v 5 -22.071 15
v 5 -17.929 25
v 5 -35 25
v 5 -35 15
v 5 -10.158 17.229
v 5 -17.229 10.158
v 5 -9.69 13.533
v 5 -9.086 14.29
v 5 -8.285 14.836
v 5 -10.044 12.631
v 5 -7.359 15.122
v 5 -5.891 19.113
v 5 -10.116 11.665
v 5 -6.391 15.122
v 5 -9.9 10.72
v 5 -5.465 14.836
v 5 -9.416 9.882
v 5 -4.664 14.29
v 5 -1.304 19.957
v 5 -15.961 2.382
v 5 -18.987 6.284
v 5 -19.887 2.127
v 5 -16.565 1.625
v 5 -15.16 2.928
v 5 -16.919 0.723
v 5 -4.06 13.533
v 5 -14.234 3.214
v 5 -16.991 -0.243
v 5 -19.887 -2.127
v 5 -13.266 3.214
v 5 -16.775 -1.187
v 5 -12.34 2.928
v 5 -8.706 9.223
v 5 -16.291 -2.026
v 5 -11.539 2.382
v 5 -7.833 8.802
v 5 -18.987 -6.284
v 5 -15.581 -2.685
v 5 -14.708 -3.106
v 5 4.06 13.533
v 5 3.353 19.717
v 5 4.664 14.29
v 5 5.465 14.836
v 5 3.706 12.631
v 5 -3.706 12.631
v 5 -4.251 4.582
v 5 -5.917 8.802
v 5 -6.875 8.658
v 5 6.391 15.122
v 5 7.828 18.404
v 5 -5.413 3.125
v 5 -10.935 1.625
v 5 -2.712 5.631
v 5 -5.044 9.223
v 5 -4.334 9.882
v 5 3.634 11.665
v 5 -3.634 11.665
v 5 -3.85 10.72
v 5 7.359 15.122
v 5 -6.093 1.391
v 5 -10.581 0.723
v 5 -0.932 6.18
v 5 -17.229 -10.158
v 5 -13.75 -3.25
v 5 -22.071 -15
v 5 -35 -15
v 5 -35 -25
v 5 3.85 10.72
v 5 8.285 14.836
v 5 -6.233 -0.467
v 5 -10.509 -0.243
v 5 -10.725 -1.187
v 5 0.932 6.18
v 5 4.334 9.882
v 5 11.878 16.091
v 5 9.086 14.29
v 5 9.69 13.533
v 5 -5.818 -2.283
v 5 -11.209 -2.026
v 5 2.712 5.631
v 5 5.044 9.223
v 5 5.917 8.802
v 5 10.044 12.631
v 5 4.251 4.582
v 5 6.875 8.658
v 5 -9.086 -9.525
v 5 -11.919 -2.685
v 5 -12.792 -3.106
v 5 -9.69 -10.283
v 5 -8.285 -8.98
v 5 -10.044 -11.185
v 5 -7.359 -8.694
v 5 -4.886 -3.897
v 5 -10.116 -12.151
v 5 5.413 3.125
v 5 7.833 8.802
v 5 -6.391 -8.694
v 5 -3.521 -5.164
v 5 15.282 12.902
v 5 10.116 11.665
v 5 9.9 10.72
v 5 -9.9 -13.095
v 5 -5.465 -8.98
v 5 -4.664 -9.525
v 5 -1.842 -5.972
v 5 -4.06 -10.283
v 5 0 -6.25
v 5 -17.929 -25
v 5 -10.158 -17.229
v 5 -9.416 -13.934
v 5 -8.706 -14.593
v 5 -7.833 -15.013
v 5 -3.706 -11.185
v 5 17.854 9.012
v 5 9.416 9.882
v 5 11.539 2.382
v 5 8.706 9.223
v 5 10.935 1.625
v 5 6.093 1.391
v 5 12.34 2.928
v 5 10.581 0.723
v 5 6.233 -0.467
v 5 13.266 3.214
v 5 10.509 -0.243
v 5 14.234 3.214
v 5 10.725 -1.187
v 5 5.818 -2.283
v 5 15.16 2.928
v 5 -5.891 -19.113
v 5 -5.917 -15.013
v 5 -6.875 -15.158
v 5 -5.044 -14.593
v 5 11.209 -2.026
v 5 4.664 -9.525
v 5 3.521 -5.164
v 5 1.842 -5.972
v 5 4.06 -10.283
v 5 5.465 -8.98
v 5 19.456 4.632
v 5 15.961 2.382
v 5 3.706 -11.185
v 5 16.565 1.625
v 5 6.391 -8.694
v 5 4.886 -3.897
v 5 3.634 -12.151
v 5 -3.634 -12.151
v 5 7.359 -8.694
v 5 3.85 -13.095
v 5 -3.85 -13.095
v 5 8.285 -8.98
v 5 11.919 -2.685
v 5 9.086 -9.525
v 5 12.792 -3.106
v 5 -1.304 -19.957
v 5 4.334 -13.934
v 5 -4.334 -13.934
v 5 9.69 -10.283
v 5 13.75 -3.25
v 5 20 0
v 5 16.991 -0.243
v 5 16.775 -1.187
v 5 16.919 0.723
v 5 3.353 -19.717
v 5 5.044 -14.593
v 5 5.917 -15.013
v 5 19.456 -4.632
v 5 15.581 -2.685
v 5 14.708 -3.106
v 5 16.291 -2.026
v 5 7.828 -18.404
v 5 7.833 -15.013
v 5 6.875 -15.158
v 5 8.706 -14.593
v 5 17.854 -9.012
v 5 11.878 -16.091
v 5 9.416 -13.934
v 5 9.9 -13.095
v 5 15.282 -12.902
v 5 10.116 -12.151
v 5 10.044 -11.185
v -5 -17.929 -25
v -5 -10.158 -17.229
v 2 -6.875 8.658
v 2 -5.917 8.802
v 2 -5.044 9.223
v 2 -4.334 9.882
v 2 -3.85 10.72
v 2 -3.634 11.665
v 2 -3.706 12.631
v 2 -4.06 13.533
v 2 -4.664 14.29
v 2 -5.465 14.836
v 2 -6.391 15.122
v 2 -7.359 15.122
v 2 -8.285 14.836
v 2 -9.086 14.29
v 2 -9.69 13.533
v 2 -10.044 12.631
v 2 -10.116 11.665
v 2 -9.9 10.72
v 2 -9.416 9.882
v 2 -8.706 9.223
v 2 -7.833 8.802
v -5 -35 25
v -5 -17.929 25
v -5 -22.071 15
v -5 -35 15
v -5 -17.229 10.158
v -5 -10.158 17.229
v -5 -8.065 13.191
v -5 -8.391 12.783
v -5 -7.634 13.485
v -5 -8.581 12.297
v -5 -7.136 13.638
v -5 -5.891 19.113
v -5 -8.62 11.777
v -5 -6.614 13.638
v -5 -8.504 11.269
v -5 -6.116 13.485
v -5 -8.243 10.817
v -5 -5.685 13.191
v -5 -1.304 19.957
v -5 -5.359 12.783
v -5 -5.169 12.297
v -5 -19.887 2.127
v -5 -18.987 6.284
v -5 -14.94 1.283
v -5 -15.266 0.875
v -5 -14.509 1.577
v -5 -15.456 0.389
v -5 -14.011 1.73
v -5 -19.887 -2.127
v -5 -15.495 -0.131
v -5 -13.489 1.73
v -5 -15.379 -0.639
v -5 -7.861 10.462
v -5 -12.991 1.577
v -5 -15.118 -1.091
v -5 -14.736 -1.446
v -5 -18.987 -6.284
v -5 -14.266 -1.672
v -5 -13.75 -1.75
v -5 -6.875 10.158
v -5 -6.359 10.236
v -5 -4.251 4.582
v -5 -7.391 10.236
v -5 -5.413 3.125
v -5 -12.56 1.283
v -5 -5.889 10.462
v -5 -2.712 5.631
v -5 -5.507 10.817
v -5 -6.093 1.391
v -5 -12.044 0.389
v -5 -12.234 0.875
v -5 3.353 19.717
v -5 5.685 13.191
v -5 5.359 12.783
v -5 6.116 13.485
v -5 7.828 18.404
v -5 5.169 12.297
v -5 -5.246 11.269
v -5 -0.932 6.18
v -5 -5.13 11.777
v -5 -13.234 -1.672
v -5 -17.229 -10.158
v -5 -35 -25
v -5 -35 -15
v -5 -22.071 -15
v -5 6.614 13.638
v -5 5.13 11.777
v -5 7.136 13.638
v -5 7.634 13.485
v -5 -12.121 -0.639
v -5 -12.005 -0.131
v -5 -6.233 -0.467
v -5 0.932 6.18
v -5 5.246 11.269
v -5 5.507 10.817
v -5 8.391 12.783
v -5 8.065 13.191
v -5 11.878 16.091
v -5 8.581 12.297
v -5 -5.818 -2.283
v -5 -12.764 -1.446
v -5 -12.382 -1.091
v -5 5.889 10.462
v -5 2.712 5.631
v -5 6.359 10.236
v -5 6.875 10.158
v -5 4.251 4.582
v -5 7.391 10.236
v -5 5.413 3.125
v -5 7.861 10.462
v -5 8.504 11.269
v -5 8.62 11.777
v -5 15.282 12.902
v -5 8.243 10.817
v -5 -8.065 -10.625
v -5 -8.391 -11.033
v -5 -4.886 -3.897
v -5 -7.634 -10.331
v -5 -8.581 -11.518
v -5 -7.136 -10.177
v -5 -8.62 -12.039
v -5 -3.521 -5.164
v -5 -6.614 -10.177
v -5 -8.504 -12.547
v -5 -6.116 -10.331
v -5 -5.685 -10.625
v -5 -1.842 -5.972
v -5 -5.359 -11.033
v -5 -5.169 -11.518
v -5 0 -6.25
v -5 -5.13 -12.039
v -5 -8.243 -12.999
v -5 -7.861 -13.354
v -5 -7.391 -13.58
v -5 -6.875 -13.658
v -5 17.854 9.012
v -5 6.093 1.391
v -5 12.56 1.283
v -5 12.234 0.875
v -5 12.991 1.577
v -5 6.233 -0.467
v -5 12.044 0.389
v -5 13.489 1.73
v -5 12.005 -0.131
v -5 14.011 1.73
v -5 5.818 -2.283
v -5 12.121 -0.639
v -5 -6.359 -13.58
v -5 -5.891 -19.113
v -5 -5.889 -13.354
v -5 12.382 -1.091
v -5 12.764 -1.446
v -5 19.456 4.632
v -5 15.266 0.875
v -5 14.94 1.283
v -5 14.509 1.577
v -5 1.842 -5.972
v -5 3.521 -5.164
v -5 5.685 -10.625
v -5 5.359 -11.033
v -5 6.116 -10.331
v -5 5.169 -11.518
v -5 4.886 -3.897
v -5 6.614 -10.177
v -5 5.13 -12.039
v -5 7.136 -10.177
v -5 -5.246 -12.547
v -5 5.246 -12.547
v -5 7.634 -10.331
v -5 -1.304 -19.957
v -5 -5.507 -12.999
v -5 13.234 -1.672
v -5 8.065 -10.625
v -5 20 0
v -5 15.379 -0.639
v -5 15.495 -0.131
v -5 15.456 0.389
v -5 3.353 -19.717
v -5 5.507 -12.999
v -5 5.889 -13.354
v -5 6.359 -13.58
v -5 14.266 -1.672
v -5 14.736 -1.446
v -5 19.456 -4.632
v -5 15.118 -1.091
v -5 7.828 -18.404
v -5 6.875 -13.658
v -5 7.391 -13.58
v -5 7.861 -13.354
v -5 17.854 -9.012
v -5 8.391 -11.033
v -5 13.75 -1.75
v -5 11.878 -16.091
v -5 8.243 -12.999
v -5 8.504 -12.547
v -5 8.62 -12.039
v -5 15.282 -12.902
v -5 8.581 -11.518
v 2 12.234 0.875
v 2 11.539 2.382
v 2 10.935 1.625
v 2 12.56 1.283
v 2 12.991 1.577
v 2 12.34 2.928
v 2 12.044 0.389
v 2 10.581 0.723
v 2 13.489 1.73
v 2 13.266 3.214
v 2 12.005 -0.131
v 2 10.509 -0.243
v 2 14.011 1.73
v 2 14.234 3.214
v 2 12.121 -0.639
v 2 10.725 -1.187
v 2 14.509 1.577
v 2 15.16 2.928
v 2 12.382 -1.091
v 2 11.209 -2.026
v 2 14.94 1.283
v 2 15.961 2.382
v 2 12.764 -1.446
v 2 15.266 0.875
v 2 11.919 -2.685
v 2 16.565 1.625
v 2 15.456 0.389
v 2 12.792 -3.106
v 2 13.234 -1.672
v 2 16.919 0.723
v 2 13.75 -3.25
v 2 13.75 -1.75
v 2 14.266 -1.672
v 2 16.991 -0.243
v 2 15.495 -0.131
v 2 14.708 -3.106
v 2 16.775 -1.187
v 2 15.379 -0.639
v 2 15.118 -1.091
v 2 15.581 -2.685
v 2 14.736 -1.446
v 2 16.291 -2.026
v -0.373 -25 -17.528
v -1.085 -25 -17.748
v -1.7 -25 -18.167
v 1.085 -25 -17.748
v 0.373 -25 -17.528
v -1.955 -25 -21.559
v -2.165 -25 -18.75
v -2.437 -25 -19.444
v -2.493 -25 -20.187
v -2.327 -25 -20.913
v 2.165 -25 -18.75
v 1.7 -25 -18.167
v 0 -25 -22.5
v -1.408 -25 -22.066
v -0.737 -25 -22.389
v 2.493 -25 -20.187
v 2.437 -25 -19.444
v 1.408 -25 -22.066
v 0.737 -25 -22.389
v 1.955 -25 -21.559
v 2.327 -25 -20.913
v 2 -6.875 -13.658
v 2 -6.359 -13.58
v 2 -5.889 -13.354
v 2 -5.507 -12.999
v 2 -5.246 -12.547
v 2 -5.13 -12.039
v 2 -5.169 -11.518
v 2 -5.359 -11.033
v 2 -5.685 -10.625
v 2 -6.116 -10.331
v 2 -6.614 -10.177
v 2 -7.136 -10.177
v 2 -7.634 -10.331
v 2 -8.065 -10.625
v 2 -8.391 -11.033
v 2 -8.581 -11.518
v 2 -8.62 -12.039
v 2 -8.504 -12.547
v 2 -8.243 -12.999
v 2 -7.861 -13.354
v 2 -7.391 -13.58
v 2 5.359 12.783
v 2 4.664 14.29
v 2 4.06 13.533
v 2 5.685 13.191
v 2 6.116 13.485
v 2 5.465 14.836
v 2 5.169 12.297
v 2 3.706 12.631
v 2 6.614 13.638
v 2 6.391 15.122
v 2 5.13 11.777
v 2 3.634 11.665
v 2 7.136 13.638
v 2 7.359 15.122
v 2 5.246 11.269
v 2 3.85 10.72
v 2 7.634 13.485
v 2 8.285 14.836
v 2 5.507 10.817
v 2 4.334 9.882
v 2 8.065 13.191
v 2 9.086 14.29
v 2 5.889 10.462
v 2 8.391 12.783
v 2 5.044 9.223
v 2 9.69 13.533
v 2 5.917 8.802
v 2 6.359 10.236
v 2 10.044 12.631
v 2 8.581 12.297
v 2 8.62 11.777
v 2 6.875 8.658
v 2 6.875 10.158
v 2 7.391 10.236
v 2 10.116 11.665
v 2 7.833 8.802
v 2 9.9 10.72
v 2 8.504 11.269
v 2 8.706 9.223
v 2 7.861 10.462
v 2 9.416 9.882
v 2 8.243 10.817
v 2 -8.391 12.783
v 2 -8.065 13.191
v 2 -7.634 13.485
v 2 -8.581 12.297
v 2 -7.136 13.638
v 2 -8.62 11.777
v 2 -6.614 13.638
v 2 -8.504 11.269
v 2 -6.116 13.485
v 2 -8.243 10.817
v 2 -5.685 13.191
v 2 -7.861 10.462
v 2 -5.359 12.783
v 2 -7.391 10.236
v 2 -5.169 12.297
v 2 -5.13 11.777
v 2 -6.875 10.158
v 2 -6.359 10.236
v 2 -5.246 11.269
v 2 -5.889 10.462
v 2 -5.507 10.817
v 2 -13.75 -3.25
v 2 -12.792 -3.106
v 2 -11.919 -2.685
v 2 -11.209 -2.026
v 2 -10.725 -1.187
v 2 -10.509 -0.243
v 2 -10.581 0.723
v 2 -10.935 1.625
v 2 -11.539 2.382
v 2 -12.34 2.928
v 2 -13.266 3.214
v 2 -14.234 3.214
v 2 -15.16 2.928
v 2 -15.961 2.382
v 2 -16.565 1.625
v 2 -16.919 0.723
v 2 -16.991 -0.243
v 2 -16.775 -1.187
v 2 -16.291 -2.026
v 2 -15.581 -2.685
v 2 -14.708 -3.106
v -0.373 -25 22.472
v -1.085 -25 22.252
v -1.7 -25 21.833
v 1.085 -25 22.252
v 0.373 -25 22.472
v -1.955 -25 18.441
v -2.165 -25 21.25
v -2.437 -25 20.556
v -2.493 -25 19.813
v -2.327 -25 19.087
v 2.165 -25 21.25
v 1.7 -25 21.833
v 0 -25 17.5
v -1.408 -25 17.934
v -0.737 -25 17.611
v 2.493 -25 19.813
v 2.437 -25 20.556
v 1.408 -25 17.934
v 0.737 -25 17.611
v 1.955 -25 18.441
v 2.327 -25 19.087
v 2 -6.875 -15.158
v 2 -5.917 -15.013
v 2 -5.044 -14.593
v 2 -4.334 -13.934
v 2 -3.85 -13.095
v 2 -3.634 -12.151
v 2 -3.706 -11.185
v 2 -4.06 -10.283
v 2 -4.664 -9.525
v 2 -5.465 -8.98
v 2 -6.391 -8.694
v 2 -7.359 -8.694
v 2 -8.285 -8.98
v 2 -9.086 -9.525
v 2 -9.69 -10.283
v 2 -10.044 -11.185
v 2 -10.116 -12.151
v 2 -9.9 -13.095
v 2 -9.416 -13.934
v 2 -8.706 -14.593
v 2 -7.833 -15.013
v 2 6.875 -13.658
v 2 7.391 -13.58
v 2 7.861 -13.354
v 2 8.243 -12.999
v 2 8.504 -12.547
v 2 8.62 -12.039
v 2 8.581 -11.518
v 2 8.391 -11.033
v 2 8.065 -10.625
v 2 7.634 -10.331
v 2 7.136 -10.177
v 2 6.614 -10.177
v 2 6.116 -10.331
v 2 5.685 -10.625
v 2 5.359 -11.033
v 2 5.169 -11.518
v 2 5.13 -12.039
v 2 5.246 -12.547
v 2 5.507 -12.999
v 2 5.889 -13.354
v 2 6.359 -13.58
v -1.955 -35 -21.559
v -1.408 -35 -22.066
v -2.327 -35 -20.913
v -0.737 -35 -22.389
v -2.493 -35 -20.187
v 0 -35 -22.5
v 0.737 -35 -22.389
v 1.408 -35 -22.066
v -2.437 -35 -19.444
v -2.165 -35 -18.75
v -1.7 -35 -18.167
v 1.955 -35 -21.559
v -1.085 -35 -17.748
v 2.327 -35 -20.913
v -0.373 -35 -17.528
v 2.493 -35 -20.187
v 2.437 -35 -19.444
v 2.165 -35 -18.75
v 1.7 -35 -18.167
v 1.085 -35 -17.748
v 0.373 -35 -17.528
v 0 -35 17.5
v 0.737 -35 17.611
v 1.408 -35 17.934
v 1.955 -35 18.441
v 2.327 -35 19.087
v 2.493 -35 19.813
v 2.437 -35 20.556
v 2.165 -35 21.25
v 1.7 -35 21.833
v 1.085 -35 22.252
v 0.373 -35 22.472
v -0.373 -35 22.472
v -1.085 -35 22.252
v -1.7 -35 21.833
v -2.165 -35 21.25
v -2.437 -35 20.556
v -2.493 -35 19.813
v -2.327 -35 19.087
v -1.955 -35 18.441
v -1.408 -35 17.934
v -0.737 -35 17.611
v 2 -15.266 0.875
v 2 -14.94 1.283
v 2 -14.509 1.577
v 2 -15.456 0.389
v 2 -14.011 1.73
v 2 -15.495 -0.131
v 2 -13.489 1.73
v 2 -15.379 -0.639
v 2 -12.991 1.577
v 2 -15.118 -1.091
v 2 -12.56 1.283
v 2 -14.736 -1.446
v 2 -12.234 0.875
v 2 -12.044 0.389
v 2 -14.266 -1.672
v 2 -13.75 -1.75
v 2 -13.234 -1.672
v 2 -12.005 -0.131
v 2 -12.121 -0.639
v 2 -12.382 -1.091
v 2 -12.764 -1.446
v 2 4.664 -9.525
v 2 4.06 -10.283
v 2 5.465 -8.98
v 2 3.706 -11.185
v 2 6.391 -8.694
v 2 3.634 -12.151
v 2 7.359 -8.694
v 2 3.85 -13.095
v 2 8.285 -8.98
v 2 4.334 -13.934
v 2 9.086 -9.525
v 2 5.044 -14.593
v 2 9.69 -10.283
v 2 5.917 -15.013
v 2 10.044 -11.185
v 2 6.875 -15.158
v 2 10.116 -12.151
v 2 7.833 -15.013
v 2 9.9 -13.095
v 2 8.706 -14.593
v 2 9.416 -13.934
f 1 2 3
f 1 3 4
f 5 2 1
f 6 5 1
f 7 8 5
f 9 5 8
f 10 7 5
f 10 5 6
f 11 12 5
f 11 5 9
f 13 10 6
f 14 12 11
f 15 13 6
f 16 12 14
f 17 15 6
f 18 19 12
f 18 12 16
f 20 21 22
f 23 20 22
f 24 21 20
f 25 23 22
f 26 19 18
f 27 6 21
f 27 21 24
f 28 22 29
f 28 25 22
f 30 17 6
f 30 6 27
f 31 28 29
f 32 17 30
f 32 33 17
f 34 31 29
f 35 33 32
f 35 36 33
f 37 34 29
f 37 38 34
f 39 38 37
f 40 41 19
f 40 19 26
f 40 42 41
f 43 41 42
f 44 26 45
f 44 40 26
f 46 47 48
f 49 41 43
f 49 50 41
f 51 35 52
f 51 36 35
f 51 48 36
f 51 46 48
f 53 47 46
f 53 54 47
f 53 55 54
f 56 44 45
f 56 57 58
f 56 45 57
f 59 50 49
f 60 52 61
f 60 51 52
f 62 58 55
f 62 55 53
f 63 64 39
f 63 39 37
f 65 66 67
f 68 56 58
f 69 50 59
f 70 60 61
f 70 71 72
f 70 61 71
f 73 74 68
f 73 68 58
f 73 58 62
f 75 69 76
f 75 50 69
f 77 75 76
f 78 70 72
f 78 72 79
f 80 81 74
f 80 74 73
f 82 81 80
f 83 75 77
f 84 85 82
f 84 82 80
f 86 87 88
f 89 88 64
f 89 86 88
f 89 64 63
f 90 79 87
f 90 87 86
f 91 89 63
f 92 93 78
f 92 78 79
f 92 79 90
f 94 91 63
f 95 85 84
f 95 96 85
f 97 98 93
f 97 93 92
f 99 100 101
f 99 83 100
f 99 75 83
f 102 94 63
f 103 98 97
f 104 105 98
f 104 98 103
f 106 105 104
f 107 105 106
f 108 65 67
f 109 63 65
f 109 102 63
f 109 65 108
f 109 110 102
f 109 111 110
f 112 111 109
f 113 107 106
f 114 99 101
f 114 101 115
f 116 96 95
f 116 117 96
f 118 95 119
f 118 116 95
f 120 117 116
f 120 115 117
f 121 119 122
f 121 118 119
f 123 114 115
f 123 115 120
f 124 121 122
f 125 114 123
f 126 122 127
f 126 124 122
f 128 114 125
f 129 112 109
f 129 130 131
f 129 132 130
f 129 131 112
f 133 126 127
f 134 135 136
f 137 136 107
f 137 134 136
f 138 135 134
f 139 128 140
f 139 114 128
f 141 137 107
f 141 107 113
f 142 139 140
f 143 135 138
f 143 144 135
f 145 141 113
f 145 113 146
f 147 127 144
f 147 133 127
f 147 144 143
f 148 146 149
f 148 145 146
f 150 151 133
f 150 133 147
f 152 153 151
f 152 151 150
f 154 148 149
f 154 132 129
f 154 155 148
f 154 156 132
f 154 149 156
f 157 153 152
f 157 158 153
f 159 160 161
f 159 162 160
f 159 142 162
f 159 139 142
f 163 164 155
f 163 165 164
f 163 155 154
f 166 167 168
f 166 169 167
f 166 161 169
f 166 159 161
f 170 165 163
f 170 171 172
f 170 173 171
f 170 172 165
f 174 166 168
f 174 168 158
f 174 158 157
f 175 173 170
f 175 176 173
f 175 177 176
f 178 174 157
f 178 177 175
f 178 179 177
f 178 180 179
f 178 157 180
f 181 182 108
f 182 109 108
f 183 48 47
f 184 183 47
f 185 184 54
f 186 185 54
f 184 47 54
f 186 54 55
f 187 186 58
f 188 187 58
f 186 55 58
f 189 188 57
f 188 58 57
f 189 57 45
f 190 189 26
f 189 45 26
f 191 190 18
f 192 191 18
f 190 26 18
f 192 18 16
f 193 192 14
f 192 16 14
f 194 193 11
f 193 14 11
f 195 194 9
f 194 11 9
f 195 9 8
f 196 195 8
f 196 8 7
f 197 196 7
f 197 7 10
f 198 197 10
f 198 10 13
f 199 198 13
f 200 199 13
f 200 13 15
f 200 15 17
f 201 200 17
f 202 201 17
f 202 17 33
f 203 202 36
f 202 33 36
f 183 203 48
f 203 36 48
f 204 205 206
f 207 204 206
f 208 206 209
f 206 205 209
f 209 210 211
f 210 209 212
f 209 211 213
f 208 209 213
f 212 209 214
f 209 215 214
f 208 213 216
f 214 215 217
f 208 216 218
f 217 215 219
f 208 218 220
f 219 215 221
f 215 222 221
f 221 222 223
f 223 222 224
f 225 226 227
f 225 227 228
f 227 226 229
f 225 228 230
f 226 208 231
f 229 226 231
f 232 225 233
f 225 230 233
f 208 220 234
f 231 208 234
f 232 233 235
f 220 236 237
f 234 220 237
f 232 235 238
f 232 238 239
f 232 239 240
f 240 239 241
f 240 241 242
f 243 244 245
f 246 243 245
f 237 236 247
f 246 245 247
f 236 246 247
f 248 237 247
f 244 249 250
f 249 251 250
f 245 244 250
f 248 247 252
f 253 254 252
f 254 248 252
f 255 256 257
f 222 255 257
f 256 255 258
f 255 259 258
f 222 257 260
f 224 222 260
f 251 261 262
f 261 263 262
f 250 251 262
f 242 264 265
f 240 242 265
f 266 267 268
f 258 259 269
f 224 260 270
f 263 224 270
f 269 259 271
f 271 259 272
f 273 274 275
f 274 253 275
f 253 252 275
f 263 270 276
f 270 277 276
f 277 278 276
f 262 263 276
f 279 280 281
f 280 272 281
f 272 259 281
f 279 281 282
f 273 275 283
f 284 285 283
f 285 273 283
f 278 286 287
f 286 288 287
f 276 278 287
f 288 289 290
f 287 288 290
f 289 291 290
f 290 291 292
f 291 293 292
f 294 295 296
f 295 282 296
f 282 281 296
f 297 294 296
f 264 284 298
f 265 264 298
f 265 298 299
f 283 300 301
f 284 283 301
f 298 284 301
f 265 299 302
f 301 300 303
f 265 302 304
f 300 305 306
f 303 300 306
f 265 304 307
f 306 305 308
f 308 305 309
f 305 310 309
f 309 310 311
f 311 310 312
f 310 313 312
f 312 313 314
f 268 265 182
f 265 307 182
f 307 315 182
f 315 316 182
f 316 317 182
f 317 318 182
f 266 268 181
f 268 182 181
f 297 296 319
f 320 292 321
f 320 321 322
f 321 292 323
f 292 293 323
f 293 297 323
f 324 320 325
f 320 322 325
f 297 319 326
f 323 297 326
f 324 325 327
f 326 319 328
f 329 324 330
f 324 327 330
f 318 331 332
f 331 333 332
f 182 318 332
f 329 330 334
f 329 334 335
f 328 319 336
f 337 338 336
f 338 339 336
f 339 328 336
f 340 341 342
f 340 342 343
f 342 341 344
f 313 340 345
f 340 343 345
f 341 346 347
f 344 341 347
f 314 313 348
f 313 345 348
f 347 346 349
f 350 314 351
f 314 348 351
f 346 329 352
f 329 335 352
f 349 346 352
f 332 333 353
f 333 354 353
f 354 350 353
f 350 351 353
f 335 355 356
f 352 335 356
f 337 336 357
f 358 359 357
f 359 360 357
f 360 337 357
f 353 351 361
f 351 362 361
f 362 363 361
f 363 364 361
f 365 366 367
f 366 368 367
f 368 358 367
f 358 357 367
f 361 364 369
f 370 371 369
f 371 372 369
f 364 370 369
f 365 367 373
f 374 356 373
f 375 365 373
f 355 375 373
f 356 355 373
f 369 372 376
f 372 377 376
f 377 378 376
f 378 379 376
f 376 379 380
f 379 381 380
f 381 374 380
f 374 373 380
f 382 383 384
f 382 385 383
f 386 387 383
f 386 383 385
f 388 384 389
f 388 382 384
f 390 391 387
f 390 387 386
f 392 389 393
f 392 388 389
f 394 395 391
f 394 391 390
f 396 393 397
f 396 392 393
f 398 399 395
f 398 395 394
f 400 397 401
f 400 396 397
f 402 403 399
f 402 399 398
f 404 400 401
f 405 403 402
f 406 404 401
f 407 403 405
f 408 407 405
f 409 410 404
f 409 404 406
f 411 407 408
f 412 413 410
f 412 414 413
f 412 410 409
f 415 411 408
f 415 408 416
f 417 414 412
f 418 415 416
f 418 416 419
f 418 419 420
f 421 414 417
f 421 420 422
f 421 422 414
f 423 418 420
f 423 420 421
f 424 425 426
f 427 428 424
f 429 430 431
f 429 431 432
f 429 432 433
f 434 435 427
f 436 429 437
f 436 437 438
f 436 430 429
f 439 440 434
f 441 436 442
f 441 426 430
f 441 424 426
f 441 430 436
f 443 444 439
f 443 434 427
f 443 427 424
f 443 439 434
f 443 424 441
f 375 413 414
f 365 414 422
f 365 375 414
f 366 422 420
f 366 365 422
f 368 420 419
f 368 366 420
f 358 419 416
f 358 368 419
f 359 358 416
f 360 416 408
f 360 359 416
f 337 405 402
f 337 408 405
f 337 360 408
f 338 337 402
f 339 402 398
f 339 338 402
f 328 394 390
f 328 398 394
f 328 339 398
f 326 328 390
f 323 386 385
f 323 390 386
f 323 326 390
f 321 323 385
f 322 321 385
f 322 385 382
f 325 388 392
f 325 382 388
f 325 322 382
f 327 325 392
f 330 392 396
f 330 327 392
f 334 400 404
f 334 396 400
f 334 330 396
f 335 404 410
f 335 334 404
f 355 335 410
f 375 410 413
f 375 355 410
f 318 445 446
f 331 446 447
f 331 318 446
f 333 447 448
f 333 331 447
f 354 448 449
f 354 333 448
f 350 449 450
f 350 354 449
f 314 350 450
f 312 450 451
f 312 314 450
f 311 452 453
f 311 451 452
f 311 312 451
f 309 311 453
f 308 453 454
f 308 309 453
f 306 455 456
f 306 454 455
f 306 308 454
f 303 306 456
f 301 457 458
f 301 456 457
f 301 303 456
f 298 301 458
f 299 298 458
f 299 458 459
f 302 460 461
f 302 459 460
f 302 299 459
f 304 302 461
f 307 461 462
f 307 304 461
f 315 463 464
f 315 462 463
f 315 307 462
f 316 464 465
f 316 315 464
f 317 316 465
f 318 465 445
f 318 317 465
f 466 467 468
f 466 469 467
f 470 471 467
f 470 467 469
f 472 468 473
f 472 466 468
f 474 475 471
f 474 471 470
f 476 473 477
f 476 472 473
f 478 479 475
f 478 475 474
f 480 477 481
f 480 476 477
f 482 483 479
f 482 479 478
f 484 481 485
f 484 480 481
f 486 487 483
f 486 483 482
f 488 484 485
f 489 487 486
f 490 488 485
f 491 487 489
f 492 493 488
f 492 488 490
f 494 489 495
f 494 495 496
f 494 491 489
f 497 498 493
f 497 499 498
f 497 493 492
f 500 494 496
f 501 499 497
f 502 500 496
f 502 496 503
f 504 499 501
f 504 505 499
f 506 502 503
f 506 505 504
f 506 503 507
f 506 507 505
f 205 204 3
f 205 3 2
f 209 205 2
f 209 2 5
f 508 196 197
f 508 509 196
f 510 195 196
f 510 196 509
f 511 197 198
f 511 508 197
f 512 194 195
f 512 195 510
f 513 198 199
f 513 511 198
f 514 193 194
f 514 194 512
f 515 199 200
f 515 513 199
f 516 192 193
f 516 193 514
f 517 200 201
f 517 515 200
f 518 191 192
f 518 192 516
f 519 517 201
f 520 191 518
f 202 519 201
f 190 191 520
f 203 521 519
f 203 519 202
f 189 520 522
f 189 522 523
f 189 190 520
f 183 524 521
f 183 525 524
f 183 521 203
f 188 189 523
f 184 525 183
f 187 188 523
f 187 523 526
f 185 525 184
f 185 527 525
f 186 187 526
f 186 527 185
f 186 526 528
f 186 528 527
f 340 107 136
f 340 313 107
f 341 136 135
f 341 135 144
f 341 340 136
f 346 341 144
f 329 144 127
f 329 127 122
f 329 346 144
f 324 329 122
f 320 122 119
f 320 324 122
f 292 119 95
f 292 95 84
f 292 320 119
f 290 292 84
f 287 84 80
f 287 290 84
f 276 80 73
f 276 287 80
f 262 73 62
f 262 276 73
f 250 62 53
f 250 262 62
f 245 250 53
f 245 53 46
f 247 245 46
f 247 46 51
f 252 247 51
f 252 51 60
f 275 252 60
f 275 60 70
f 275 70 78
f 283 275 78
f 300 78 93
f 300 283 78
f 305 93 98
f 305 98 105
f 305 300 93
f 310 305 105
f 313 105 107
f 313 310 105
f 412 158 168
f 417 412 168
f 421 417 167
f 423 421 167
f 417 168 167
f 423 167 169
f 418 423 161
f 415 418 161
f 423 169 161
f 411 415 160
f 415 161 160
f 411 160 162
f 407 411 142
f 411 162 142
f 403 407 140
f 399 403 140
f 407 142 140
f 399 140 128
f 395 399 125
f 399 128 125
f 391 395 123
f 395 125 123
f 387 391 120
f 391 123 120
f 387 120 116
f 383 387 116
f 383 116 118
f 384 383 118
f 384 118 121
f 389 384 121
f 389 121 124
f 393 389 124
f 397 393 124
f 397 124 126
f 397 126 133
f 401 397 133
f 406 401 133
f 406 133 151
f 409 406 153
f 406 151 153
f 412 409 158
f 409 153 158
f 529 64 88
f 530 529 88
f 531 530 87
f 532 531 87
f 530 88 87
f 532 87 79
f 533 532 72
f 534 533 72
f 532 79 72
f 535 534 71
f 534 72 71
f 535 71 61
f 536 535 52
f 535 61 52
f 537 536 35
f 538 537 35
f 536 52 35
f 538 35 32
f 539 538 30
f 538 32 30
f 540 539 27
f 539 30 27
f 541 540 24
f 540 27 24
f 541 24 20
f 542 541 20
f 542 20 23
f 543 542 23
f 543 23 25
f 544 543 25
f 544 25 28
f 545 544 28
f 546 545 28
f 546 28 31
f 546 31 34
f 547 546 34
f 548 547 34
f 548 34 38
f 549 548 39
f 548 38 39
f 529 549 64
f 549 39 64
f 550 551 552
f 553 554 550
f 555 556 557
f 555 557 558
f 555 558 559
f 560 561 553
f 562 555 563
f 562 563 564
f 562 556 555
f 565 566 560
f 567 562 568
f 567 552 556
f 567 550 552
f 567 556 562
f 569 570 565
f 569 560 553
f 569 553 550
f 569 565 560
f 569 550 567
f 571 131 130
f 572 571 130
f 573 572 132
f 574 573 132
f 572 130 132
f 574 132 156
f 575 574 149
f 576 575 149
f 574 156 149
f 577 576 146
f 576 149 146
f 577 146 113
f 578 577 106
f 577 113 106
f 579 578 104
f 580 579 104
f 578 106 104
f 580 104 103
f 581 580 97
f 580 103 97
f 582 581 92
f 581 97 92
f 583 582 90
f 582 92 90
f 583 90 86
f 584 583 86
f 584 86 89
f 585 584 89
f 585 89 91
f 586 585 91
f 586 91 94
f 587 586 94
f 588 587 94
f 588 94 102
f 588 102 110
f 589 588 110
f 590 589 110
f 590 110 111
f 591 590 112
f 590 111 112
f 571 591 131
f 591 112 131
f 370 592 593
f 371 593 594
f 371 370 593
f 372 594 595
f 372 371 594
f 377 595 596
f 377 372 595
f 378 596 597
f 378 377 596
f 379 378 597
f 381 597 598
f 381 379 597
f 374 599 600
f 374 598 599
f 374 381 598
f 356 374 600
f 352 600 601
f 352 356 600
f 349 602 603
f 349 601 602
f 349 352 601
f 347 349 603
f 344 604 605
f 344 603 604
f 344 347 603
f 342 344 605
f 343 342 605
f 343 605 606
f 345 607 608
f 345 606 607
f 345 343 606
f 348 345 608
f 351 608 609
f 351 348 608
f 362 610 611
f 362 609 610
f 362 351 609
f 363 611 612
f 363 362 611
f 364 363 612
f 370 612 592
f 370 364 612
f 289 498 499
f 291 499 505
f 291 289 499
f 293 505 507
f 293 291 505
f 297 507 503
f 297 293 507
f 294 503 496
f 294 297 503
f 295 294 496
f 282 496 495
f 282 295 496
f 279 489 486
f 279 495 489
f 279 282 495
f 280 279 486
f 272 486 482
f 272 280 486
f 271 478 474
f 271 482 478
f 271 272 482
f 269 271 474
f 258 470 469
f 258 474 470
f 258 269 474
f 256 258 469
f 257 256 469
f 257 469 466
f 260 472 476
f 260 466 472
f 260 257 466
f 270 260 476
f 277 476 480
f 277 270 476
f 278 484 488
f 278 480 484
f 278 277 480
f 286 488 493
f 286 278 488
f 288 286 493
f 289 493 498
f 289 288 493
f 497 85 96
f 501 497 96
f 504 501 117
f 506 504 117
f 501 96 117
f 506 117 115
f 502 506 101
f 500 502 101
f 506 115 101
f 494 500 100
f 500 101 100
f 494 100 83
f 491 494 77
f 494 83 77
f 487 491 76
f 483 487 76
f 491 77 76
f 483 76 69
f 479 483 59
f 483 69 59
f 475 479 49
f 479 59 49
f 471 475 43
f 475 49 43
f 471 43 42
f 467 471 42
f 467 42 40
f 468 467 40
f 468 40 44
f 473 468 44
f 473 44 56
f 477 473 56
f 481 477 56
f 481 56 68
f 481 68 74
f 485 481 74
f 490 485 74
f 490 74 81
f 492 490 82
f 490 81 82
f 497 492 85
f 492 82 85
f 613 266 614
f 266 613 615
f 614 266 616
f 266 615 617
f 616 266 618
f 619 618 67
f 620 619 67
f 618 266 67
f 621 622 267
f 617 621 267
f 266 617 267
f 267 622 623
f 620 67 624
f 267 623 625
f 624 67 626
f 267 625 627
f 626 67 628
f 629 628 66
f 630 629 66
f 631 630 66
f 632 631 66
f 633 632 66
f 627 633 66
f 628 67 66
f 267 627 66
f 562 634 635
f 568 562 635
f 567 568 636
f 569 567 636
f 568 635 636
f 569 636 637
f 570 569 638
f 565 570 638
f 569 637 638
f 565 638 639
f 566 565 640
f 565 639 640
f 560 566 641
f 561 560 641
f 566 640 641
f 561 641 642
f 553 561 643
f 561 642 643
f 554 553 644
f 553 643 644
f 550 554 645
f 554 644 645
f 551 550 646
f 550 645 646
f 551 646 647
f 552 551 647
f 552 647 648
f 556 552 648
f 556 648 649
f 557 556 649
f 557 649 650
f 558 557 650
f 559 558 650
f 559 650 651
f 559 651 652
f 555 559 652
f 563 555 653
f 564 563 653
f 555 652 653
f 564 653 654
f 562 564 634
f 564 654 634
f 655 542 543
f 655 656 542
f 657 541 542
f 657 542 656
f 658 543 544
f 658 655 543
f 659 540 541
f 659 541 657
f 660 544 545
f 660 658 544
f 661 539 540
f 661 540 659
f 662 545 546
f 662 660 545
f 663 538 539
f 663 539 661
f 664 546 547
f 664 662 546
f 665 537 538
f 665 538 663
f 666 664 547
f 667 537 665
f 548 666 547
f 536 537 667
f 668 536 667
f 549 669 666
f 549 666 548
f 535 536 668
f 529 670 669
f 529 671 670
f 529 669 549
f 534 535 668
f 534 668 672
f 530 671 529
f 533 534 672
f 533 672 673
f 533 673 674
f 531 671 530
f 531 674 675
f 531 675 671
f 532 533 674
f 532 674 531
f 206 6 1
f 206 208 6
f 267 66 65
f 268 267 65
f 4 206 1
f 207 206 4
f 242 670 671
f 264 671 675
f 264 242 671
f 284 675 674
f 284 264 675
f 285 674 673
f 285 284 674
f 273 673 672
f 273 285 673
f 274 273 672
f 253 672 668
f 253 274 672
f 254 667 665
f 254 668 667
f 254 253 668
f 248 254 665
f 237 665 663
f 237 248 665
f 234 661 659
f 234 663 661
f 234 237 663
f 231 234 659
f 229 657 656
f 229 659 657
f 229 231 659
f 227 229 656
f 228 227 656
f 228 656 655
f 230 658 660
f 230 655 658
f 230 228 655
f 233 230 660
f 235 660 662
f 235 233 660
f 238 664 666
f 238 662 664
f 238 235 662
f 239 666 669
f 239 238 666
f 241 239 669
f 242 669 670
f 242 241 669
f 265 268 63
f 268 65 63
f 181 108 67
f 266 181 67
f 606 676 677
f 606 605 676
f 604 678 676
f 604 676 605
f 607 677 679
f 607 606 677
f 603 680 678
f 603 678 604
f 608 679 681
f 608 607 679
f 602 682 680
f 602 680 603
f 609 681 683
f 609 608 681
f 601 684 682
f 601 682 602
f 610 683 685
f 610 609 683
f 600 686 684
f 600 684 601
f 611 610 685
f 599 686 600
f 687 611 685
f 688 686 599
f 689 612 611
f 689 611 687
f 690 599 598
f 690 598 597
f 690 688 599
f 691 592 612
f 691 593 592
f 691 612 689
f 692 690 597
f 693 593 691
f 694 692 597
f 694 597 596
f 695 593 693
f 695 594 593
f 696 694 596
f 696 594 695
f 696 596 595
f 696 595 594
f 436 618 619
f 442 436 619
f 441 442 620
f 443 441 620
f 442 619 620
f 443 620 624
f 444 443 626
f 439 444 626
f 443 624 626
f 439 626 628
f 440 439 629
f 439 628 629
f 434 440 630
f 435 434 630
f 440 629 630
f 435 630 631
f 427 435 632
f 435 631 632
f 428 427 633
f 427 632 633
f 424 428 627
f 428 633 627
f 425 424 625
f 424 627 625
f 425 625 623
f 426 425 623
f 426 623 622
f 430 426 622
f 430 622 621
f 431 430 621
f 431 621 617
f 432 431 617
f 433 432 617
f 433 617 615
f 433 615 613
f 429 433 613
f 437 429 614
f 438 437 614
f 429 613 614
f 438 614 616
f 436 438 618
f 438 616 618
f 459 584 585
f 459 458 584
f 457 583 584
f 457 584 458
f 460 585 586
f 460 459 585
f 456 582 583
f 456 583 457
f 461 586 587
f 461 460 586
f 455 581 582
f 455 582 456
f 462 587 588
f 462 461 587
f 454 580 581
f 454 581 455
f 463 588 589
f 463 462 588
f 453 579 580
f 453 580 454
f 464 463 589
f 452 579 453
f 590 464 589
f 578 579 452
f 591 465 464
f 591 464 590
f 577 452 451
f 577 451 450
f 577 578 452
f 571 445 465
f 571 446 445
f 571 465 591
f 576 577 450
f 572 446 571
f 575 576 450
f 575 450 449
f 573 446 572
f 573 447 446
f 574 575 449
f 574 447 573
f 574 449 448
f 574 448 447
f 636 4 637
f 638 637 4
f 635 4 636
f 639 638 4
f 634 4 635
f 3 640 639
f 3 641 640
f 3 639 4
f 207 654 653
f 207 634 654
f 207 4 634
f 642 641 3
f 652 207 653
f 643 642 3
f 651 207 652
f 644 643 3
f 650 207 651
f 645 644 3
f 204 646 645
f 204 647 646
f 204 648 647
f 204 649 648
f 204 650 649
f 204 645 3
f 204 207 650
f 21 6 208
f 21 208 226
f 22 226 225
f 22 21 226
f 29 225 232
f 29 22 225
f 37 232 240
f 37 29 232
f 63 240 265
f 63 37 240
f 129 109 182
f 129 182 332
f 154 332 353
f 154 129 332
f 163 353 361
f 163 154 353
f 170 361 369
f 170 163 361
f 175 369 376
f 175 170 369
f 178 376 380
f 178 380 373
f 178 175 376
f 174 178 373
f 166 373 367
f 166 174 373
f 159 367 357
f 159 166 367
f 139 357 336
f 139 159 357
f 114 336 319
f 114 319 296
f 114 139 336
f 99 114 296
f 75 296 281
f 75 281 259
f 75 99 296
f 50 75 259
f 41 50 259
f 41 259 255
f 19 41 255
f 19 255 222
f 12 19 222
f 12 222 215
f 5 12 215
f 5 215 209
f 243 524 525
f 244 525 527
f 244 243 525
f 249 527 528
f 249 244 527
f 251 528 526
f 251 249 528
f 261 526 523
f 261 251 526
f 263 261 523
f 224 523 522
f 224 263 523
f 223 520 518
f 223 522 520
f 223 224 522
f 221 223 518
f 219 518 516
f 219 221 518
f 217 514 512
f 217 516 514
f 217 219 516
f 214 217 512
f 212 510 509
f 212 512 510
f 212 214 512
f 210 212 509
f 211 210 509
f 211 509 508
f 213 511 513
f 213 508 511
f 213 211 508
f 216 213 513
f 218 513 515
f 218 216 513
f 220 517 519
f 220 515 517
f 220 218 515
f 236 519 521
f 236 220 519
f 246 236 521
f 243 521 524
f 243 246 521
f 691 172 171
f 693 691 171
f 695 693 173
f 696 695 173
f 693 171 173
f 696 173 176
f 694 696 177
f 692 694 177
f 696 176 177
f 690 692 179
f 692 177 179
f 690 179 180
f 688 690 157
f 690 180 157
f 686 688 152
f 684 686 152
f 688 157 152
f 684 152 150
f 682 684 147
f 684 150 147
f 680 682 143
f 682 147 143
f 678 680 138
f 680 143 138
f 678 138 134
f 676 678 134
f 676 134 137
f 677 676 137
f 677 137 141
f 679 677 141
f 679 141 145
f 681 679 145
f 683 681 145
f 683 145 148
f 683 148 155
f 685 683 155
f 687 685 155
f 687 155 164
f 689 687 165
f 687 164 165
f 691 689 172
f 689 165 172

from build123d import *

# Parameters (mm, degrees)
CROQUIS1_R              = 20
CROQUIS1_R_2            = 6.25
CROQUIS1_R_3            = 1.75
SALIENTE_EXTRUIR1_DEPTH = 5
SALIENTE_EXTRUIR2_DEPTH = 5
CROQUIS3_R              = 3.25
CORTAR_EXTRUIR1_DEPTH   = 3
CROQUIS4_R              = 2.5
CORTAR_EXTRUIR2_DEPTH   = 10


with BuildPart() as part:
    # Croquis1 → Saliente-Extruir1 (new, symmetric)
    with BuildSketch(Plane(origin=(0, 0, 0), x_dir=(0, 0, -1), z_dir=(1, 0, 0))):
        Circle(CROQUIS1_R)
        Circle(CROQUIS1_R_2, mode=Mode.SUBTRACT)
        with Locations((0, 13.75)):
            Circle(CROQUIS1_R_3, mode=Mode.SUBTRACT)
        with Locations((11.907849302, 6.875)):
            Circle(CROQUIS1_R_3, mode=Mode.SUBTRACT)
        with Locations((11.907849302, -6.875)):
            Circle(CROQUIS1_R_3, mode=Mode.SUBTRACT)
        with Locations((0, -13.75)):
            Circle(CROQUIS1_R_3, mode=Mode.SUBTRACT)
        with Locations((-11.907849302, -6.875)):
            Circle(CROQUIS1_R_3, mode=Mode.SUBTRACT)
        with Locations((-11.907849302, 6.875)):
            Circle(CROQUIS1_R_3, mode=Mode.SUBTRACT)
    extrude(amount=SALIENTE_EXTRUIR1_DEPTH, both=True)

    # Croquis2 → Saliente-Extruir2 (add, symmetric)
    with BuildSketch(Plane(origin=(0, 0, 0), x_dir=(0, 0, -1), z_dir=(1, 0, 0))):
        with BuildLine():
            Line((-15, -35), (-25, -35))
            Line((-25, -35), (-25, -17.928932188))
            Line((-25, -17.928932188), (-17.228597844, -10.157530032))
            ThreePointArc((-17.228597844, -10.157530032), (-14.142135624, -14.142135624), (-10.157530032, -17.228597844))
            Line((-10.157530032, -17.228597844), (-15, -22.071067812))
            Line((-15, -22.071067812), (-15, -35))
        make_face()
        with BuildLine():
            Line((15, -35), (15, -22.071067812))
            Line((15, -22.071067812), (10.157530032, -17.228597844))
            ThreePointArc((10.157530032, -17.228597844), (14.142135624, -14.142135624), (17.228597844, -10.157530032))
            Line((17.228597844, -10.157530032), (25, -17.928932188))
            Line((25, -17.928932188), (25, -35))
            Line((25, -35), (15, -35))
        make_face()
    extrude(amount=SALIENTE_EXTRUIR2_DEPTH, both=True)

    # Croquis3 → Cortar-Extruir1 (cut)
    with BuildSketch(Plane(origin=(5, 0, 0), x_dir=(0, 0, -1), z_dir=(1, 0, 0))):
        with Locations((0, 13.75)):
            Circle(CROQUIS3_R)
        with Locations((11.907849302, 6.875)):
            Circle(CROQUIS3_R)
        with Locations((11.907849302, -6.875)):
            Circle(CROQUIS3_R)
        with Locations((0, -13.75)):
            Circle(CROQUIS3_R)
        with Locations((-11.907849302, -6.875)):
            Circle(CROQUIS3_R)
        with Locations((-11.907849302, 6.875)):
            Circle(CROQUIS3_R)
    extrude(amount=-CORTAR_EXTRUIR1_DEPTH, mode=Mode.SUBTRACT)

    # Croquis4 → Cortar-Extruir2 (cut)
    with BuildSketch(Plane.XZ.offset(35)):
        with Locations(Location((0, 20, 0), (0, 0, 270))):
            Circle(CROQUIS4_R)
        with Locations(Location((0, -20, 0), (0, 0, 270))):
            Circle(CROQUIS4_R)
    extrude(amount=-CORTAR_EXTRUIR2_DEPTH, mode=Mode.SUBTRACT)


solid = part.part
